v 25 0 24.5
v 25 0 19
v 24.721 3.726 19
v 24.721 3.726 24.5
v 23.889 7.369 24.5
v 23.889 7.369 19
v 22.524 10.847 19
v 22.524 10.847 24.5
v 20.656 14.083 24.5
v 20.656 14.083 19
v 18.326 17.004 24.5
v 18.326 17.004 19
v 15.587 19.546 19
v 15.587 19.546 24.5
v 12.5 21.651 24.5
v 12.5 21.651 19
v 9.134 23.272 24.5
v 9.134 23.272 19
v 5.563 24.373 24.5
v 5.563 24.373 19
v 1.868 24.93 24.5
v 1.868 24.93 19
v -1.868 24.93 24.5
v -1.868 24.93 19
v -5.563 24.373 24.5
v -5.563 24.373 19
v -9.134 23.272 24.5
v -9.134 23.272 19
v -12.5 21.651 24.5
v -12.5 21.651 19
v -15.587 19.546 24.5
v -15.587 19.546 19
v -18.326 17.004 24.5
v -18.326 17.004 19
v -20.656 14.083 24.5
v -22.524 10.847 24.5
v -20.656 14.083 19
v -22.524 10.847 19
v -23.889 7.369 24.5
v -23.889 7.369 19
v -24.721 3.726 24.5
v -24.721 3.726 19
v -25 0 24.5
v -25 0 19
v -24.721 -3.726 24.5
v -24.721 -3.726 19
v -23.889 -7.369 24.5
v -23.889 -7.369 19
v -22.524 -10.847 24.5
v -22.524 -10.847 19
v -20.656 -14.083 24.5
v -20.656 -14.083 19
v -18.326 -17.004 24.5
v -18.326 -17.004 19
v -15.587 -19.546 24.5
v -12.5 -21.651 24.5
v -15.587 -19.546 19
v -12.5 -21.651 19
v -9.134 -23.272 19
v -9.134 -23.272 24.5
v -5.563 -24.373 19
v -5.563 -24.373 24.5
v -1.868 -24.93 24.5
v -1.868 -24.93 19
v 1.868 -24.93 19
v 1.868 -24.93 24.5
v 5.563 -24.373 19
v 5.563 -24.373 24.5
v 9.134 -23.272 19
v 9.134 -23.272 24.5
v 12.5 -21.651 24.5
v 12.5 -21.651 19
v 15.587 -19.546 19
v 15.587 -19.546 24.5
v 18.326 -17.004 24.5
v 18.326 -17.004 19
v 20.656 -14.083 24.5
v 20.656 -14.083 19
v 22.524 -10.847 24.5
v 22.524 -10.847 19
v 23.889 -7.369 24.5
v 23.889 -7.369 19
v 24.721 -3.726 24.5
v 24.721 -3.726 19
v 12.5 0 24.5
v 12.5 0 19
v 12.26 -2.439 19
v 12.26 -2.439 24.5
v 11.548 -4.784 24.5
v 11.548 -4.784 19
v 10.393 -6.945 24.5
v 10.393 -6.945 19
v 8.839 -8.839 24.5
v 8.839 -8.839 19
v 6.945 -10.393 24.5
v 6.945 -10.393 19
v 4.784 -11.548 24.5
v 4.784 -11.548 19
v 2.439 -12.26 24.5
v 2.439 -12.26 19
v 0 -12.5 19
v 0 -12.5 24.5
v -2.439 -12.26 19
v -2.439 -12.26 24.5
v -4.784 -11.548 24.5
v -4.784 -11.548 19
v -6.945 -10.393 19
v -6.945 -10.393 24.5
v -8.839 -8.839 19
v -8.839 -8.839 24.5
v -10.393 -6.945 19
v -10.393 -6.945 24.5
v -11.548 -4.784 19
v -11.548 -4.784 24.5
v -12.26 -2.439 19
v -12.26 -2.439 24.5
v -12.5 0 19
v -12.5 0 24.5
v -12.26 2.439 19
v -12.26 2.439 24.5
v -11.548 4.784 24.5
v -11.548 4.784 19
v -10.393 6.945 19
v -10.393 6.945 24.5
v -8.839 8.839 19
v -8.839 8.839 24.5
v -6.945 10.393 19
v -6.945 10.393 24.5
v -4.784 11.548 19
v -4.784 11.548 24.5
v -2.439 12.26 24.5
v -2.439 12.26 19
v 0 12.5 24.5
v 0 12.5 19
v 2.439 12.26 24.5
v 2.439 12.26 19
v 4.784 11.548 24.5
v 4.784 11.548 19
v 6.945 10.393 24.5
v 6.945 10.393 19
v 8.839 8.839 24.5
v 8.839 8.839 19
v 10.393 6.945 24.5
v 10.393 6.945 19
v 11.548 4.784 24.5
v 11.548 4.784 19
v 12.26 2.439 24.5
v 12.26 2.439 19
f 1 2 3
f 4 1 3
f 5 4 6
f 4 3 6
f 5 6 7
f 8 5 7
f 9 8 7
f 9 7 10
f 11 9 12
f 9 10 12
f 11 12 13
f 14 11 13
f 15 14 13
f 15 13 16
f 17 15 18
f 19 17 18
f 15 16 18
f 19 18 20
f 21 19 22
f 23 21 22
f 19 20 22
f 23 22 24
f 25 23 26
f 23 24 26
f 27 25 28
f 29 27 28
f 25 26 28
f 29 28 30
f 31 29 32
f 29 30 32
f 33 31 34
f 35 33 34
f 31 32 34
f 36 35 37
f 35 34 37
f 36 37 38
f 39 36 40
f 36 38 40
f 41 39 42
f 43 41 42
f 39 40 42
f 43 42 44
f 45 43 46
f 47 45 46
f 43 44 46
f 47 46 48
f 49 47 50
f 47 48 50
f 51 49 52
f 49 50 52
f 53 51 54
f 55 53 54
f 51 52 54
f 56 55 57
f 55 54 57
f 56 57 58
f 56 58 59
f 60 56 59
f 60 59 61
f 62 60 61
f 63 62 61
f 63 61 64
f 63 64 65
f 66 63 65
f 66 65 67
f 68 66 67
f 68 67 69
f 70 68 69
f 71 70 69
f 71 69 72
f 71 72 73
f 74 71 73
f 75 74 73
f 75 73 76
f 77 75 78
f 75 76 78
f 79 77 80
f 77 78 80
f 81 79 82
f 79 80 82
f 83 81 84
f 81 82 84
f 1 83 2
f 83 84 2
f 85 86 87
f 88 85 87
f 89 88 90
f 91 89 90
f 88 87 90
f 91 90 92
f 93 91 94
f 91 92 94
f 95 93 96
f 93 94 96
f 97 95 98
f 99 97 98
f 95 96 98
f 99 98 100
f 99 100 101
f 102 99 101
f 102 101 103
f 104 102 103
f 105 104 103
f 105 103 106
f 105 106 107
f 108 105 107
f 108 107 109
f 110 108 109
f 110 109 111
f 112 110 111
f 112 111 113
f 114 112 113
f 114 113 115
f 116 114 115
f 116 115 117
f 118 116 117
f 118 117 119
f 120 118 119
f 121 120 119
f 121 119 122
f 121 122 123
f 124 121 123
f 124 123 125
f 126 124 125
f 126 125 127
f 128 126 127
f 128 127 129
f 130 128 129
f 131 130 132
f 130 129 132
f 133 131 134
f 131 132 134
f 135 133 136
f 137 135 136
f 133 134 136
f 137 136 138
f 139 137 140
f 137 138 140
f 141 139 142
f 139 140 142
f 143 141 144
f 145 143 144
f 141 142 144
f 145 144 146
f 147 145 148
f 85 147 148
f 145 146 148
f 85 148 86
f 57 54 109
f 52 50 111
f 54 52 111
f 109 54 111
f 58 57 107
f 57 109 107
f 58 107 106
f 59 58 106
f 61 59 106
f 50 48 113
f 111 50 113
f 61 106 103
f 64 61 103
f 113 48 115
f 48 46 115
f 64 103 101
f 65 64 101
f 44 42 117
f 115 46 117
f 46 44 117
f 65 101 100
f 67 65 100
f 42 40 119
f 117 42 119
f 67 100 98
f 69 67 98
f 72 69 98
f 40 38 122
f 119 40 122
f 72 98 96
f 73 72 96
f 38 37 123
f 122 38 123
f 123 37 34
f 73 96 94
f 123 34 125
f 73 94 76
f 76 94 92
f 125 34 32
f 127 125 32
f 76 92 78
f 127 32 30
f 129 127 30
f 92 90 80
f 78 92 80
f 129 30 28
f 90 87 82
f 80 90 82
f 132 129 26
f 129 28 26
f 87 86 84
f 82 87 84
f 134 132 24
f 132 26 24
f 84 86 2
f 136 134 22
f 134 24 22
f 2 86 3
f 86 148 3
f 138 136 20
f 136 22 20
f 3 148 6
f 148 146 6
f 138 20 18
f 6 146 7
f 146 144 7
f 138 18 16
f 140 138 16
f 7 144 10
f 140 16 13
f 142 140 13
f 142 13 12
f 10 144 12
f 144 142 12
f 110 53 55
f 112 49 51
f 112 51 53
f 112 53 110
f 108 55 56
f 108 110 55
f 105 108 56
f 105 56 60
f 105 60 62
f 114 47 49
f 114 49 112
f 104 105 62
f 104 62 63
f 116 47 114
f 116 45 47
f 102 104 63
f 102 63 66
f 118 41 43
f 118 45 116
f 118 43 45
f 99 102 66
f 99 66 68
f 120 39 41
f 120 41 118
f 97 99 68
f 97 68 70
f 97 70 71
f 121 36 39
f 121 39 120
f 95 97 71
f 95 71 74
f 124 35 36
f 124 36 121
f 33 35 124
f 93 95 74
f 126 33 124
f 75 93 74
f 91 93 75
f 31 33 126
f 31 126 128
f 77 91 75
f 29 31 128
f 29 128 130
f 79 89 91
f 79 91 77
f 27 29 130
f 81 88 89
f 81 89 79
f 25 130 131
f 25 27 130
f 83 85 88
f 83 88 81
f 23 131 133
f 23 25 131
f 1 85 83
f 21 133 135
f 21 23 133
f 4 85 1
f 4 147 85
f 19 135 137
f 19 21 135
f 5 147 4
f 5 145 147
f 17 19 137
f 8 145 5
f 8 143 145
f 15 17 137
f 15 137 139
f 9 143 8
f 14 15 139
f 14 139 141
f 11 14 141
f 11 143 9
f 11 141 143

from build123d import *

# Parameters (mm, degrees)
F0_W      = 100
F0_H      = 35
F1_DEPTH  = 18
F2_R      = 12.7
F3_DEPTH  = 19
F4_R      = 25
F4_R_2    = 12.7
F5_DEPTH  = 5.5
F6_R      = 2.5
F7_DEPTH  = 3
F8_W      = 100
F8_H      = 57
F8_H_2    = 18
F9_DEPTH  = 12
F11_DEPTH = 50
F13_D     = 12
F13_DEPTH = 12
F14_W     = 15
F14_H     = 18
F15_DEPTH = 35
F17_W     = 150.604561
F17_H     = 102.203328
F18_DEPTH = 94
F19_R     = 12.5
F20_DEPTH = 25


with BuildPart() as f1:
    # F0 (on Top) → F1 (new body)
    with BuildSketch(Plane.XY):
        Rectangle(F0_W, F0_H)
    extrude(amount=-F1_DEPTH)

    # F2 (on face) → F3 (join)
    with BuildSketch(Plane.XY):
        Circle(F2_R)
    extrude(amount=F3_DEPTH)

    # F4 (on face) → F5 (join)
    with BuildSketch(Plane.XY.offset(19)):
        Circle(F4_R)
        Circle(F4_R_2, mode=Mode.SUBTRACT)
        Circle(F4_R_2)
    extrude(amount=F5_DEPTH)

    # F6 (on face) → F7 (join)
    with BuildSketch(Plane.XY.offset(24.5)):
        Circle(F6_R)
    extrude(amount=F7_DEPTH)

    # F8 (on face) → F9 (join)
    with BuildSketch(Plane.XZ.offset(17.5)):
        with Locations((0, -46.5)):
            Rectangle(F8_W, F8_H)
        with Locations((0, -9)):
            Rectangle(F8_W, F8_H_2)
    extrude(amount=F9_DEPTH)

    # F10 (on face) → F11 (cut)
    with BuildSketch(Plane.XZ.offset(29.5)):
        Polygon((-37.5, -50), (-37.5, 0), (-50, 0), (-50, -75), (50, -75), (50, 0), (37.5, 0), (37.5, -50), align=None)
    extrude(amount=-F11_DEPTH, mode=Mode.SUBTRACT)

    # F13
    with Locations(Plane(origin=(0, -17.5, 0), x_dir=(-1, 0, 0), z_dir=(0, 1, 0))):
        with Locations((-22.5, -35), (22.5, -35)):
            Hole(F13_D / 2, depth=F13_DEPTH)

    # F14 (on face) → F15 (cut)
    with BuildSketch(Plane(origin=(0, 17.5, 0), x_dir=(-1, 0, 0), z_dir=(0, 1, 0))):
        with Locations((-30, -9)):
            Rectangle(F14_W, F14_H)
        with Locations((30, -9)):
            Rectangle(F14_W, F14_H)
    extrude(amount=-F15_DEPTH, mode=Mode.SUBTRACT)

    # F17 (on offset) → F18 (cut)
    with BuildSketch(Plane(origin=(0, -23.5, -75), x_dir=(1, 0, 0), z_dir=(0, 0, -1))):
        with Locations((5.335175, 0.654457)):
            Rectangle(F17_W, F17_H)
    extrude(amount=-F18_DEPTH, mode=Mode.SUBTRACT)

    # F19 (on face) → F20 (cut)
    with BuildSketch(Plane(origin=(0, 0, 19), x_dir=(1, 0, 0), z_dir=(0, 0, -1))):
        Circle(F19_R)
    extrude(amount=-F20_DEPTH, mode=Mode.SUBTRACT)


solid = f1.part
